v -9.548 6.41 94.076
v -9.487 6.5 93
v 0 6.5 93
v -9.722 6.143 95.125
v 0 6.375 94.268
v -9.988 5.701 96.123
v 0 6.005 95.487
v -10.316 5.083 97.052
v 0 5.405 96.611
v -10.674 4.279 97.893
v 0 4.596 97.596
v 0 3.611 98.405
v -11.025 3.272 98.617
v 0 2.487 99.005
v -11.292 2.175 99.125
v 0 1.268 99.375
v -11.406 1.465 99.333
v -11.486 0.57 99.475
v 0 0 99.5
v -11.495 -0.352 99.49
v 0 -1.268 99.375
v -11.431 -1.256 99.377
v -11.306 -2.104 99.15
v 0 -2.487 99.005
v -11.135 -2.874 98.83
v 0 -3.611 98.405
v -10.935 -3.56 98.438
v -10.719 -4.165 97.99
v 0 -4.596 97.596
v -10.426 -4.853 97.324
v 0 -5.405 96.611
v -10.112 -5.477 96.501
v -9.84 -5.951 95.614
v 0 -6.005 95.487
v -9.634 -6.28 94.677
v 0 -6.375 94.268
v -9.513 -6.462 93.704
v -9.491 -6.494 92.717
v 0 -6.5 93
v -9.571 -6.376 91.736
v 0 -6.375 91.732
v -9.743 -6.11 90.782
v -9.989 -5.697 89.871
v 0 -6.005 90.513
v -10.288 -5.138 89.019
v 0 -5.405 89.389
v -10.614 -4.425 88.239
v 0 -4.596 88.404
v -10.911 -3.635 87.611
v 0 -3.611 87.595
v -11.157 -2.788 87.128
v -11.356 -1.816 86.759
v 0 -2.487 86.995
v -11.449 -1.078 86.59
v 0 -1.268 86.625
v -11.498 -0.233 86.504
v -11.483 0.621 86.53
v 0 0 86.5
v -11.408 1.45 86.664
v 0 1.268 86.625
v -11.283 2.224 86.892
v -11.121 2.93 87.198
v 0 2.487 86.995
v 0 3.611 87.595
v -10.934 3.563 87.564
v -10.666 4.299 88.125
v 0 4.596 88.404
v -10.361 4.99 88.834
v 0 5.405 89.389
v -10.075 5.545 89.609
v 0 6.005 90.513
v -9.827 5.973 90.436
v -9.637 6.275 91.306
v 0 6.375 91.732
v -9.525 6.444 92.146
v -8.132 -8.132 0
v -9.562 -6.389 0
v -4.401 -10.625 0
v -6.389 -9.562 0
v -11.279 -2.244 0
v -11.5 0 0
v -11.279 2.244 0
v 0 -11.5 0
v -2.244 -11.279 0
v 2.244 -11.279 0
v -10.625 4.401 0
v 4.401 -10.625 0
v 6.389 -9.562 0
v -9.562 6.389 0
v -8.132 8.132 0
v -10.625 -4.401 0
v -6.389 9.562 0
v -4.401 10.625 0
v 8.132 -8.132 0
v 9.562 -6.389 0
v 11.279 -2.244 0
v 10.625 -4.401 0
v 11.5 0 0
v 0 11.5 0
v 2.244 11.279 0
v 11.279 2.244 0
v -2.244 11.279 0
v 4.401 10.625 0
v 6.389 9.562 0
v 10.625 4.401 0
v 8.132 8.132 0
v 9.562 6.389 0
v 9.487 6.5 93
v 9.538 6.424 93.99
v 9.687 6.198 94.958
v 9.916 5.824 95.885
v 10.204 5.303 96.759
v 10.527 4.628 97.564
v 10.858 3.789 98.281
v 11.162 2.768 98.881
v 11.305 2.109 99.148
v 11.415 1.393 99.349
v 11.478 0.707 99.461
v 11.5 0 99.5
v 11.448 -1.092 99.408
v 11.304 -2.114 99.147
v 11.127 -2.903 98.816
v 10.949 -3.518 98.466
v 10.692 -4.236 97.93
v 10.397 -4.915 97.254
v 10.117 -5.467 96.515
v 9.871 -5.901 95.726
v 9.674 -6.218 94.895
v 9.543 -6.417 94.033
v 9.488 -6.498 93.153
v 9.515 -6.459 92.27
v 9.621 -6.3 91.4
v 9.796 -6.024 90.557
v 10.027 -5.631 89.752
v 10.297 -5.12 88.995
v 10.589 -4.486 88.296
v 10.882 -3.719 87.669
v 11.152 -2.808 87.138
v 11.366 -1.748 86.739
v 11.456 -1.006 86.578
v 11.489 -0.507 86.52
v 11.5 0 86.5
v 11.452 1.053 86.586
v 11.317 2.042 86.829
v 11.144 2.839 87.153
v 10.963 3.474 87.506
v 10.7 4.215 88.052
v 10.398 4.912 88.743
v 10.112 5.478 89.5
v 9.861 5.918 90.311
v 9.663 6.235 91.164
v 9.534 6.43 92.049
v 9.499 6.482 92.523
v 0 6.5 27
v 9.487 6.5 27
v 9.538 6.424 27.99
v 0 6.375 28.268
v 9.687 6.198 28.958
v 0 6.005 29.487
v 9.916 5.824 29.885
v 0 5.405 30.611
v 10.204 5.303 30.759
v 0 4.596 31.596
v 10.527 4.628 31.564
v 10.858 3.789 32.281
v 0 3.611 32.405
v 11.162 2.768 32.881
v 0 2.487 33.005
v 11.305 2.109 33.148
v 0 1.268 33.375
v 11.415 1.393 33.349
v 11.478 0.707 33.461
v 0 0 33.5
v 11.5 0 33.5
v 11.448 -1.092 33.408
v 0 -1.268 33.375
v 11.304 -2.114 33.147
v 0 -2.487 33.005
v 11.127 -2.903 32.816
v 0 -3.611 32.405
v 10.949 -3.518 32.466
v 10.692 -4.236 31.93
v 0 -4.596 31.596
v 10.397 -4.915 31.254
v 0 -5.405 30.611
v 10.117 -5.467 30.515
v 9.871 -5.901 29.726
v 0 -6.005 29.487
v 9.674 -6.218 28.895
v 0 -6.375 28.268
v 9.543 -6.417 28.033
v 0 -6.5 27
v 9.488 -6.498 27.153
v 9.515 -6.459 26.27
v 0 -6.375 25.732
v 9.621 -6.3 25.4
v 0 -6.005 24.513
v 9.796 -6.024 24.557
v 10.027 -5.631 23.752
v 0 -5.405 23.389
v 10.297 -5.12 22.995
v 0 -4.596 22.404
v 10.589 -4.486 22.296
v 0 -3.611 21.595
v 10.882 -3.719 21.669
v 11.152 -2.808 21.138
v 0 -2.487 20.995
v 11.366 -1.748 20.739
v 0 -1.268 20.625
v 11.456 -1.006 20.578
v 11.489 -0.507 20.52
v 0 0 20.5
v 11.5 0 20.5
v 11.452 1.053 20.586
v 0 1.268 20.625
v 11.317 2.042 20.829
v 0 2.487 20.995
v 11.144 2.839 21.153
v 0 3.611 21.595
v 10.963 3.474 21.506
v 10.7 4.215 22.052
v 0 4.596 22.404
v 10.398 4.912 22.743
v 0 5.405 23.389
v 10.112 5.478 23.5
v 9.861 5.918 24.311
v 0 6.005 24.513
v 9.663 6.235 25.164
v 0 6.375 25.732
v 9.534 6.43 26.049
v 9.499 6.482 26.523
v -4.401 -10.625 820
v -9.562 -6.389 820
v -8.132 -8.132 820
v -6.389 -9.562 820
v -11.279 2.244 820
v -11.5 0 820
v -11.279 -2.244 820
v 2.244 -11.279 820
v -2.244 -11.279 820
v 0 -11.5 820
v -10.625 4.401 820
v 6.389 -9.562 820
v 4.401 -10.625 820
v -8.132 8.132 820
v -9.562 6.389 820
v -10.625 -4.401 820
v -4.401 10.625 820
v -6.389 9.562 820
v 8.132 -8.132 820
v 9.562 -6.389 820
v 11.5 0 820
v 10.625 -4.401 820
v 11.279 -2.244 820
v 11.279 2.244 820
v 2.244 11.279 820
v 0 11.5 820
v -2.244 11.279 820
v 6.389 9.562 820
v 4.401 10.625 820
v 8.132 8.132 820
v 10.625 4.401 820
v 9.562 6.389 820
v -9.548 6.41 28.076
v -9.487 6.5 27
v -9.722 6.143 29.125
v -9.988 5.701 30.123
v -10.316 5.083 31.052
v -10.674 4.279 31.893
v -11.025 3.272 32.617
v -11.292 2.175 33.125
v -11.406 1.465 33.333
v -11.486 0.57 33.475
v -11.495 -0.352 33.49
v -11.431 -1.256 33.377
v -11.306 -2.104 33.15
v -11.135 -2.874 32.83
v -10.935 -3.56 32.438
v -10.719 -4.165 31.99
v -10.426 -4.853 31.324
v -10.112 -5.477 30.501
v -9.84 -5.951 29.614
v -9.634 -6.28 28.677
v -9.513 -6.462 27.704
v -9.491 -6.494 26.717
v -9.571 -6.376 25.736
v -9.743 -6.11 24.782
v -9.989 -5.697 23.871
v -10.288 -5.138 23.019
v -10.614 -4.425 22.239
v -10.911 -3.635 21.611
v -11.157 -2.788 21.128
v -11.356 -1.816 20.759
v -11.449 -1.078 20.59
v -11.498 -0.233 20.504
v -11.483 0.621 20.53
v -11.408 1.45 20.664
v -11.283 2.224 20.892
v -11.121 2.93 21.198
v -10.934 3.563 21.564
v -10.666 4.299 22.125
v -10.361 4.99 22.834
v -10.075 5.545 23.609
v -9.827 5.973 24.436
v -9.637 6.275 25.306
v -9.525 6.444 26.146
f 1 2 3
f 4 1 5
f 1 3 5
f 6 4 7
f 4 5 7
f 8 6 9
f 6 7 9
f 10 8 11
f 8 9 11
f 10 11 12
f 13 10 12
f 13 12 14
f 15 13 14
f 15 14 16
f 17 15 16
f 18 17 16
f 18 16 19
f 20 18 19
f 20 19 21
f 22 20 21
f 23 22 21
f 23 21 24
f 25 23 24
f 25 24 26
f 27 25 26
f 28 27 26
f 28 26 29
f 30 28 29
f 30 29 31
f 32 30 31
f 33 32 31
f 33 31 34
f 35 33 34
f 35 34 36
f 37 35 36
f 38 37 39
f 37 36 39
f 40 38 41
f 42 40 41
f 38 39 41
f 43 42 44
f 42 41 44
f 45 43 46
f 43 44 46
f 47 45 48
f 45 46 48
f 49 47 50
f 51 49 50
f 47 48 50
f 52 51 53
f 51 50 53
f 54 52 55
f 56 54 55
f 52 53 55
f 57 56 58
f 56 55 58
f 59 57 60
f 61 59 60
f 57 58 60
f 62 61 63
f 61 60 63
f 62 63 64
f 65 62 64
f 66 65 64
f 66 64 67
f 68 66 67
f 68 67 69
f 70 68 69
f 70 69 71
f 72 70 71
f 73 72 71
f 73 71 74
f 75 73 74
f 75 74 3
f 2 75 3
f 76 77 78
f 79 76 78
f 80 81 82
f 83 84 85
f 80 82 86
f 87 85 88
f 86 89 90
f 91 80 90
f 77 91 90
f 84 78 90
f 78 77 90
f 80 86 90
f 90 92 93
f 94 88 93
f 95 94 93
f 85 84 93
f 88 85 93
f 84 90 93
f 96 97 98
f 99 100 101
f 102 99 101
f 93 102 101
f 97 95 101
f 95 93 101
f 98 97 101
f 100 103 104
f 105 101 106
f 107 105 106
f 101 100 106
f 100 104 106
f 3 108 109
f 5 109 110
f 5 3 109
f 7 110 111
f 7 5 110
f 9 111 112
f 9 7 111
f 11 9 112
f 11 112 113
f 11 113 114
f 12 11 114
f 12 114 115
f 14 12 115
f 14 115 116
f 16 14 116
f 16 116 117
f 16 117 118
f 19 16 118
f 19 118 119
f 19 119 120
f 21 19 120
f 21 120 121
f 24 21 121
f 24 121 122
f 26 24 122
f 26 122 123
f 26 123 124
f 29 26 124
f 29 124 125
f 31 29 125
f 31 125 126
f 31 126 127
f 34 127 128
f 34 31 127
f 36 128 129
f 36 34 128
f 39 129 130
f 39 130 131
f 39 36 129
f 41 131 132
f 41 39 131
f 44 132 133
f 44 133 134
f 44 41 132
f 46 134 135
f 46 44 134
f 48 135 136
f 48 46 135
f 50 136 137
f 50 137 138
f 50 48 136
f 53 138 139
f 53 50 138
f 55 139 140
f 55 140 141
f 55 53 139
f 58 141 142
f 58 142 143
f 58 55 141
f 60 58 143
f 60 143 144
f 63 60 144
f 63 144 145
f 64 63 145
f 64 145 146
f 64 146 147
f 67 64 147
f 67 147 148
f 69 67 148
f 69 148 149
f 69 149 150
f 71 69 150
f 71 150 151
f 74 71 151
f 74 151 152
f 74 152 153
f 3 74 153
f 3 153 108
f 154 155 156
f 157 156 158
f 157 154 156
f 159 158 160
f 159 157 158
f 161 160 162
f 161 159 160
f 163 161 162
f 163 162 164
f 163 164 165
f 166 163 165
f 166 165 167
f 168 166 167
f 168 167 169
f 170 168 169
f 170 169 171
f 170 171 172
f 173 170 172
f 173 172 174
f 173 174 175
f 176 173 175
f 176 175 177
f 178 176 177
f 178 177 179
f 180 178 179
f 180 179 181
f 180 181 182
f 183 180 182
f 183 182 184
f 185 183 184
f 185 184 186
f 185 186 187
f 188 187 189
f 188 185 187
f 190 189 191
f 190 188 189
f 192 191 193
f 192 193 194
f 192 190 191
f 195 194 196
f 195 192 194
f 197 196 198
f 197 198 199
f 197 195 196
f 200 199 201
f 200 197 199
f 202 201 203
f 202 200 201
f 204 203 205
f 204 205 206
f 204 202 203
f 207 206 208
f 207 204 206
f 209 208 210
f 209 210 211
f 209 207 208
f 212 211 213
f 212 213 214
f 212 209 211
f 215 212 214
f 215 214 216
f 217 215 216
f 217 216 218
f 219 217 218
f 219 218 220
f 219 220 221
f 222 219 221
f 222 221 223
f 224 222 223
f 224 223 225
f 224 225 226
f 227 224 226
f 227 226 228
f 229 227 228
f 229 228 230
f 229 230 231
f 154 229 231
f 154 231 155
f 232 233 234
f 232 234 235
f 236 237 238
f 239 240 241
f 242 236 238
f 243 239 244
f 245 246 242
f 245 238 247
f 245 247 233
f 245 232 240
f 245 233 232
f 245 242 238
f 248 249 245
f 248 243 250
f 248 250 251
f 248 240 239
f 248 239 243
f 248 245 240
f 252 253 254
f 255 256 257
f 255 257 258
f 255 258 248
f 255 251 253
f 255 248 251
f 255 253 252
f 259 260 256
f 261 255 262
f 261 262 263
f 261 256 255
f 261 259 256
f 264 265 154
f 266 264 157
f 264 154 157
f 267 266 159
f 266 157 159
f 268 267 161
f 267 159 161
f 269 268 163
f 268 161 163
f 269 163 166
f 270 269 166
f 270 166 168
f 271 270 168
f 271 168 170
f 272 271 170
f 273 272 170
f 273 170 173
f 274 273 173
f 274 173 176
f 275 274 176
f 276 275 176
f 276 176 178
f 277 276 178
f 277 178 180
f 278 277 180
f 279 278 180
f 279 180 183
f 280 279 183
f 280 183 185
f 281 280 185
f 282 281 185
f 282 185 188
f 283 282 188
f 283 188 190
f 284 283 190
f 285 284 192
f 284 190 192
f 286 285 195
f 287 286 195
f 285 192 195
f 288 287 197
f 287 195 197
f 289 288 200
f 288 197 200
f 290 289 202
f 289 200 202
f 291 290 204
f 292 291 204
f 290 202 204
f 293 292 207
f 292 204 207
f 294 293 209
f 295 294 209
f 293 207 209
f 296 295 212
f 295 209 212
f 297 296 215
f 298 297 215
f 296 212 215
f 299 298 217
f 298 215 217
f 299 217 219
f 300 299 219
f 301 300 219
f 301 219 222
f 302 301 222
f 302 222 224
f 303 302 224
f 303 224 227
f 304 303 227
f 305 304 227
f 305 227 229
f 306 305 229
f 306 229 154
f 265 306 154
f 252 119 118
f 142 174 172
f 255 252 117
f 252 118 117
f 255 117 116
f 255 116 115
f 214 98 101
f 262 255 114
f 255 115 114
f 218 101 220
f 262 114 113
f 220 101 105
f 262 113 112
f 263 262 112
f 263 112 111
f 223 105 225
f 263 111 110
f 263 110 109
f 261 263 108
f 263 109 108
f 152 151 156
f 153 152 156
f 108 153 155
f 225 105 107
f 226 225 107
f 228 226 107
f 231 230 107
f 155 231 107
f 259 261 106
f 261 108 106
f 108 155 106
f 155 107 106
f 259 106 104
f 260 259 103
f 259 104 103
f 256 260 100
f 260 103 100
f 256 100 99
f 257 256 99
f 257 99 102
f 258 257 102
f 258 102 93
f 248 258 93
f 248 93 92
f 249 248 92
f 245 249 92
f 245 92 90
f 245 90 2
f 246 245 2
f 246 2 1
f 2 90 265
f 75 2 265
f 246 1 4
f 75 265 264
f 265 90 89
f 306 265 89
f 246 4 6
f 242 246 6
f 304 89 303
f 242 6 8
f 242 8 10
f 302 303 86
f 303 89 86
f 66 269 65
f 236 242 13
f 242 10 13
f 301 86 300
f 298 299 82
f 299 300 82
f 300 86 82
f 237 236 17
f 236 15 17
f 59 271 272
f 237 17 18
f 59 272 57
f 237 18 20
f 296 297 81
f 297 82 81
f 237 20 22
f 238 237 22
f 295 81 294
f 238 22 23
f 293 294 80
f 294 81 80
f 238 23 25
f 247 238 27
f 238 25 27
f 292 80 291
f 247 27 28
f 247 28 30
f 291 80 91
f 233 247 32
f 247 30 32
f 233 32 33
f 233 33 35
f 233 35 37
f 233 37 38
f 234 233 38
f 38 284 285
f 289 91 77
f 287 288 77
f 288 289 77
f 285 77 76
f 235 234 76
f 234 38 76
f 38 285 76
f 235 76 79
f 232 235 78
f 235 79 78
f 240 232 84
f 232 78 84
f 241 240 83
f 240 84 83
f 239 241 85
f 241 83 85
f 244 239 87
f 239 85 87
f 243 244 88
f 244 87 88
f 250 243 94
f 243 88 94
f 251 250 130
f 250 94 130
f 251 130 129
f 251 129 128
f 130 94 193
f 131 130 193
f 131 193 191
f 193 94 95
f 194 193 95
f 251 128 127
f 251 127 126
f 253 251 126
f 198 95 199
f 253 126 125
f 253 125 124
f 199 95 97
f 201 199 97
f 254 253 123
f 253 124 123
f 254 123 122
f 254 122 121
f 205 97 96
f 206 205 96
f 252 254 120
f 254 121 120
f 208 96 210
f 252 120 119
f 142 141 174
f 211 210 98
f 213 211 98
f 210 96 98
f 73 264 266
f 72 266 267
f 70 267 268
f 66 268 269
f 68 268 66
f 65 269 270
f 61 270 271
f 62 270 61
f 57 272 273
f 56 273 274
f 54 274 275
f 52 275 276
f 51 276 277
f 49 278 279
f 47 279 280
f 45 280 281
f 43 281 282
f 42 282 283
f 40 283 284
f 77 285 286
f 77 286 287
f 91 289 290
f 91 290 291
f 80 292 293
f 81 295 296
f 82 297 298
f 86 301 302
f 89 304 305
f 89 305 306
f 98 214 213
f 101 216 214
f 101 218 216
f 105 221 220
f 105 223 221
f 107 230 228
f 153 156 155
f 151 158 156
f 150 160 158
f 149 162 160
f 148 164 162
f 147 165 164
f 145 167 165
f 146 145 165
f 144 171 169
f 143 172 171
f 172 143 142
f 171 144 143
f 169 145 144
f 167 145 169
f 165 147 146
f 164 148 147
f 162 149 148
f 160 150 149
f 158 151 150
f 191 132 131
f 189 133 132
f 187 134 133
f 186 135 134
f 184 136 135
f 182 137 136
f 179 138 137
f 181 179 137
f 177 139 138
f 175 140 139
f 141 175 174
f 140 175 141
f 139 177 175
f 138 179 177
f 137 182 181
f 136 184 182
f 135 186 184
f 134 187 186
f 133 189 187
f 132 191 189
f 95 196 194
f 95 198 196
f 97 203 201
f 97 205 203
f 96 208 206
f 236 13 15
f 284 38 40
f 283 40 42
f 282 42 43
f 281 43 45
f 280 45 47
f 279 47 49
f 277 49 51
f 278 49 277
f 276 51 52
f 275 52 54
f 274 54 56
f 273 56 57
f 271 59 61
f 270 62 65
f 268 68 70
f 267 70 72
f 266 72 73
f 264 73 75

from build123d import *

# Parameters (mm, degrees)
F0_R          = 11.5
F1_DEPTH      = 820
F2_R          = 6.5
F3_DEPTH      = 100
F3_DEPTH_BACK = 25


with BuildPart() as f1:
    # F0 (on Top) → F1 (new body)
    with BuildSketch(Plane.XY):
        Circle(F0_R)
    extrude(amount=F1_DEPTH)

    # F2 (on Right) → F3 (cut, two sides)
    with BuildSketch(Plane.YZ) as f3_sk:
        with Locations((0, 27)):
            Circle(F2_R)
        with Locations((0, 93)):
            Circle(F2_R)
    extrude(amount=-F3_DEPTH, mode=Mode.SUBTRACT)
    extrude(f3_sk.sketch, amount=F3_DEPTH_BACK, mode=Mode.SUBTRACT)


solid = f1.part
